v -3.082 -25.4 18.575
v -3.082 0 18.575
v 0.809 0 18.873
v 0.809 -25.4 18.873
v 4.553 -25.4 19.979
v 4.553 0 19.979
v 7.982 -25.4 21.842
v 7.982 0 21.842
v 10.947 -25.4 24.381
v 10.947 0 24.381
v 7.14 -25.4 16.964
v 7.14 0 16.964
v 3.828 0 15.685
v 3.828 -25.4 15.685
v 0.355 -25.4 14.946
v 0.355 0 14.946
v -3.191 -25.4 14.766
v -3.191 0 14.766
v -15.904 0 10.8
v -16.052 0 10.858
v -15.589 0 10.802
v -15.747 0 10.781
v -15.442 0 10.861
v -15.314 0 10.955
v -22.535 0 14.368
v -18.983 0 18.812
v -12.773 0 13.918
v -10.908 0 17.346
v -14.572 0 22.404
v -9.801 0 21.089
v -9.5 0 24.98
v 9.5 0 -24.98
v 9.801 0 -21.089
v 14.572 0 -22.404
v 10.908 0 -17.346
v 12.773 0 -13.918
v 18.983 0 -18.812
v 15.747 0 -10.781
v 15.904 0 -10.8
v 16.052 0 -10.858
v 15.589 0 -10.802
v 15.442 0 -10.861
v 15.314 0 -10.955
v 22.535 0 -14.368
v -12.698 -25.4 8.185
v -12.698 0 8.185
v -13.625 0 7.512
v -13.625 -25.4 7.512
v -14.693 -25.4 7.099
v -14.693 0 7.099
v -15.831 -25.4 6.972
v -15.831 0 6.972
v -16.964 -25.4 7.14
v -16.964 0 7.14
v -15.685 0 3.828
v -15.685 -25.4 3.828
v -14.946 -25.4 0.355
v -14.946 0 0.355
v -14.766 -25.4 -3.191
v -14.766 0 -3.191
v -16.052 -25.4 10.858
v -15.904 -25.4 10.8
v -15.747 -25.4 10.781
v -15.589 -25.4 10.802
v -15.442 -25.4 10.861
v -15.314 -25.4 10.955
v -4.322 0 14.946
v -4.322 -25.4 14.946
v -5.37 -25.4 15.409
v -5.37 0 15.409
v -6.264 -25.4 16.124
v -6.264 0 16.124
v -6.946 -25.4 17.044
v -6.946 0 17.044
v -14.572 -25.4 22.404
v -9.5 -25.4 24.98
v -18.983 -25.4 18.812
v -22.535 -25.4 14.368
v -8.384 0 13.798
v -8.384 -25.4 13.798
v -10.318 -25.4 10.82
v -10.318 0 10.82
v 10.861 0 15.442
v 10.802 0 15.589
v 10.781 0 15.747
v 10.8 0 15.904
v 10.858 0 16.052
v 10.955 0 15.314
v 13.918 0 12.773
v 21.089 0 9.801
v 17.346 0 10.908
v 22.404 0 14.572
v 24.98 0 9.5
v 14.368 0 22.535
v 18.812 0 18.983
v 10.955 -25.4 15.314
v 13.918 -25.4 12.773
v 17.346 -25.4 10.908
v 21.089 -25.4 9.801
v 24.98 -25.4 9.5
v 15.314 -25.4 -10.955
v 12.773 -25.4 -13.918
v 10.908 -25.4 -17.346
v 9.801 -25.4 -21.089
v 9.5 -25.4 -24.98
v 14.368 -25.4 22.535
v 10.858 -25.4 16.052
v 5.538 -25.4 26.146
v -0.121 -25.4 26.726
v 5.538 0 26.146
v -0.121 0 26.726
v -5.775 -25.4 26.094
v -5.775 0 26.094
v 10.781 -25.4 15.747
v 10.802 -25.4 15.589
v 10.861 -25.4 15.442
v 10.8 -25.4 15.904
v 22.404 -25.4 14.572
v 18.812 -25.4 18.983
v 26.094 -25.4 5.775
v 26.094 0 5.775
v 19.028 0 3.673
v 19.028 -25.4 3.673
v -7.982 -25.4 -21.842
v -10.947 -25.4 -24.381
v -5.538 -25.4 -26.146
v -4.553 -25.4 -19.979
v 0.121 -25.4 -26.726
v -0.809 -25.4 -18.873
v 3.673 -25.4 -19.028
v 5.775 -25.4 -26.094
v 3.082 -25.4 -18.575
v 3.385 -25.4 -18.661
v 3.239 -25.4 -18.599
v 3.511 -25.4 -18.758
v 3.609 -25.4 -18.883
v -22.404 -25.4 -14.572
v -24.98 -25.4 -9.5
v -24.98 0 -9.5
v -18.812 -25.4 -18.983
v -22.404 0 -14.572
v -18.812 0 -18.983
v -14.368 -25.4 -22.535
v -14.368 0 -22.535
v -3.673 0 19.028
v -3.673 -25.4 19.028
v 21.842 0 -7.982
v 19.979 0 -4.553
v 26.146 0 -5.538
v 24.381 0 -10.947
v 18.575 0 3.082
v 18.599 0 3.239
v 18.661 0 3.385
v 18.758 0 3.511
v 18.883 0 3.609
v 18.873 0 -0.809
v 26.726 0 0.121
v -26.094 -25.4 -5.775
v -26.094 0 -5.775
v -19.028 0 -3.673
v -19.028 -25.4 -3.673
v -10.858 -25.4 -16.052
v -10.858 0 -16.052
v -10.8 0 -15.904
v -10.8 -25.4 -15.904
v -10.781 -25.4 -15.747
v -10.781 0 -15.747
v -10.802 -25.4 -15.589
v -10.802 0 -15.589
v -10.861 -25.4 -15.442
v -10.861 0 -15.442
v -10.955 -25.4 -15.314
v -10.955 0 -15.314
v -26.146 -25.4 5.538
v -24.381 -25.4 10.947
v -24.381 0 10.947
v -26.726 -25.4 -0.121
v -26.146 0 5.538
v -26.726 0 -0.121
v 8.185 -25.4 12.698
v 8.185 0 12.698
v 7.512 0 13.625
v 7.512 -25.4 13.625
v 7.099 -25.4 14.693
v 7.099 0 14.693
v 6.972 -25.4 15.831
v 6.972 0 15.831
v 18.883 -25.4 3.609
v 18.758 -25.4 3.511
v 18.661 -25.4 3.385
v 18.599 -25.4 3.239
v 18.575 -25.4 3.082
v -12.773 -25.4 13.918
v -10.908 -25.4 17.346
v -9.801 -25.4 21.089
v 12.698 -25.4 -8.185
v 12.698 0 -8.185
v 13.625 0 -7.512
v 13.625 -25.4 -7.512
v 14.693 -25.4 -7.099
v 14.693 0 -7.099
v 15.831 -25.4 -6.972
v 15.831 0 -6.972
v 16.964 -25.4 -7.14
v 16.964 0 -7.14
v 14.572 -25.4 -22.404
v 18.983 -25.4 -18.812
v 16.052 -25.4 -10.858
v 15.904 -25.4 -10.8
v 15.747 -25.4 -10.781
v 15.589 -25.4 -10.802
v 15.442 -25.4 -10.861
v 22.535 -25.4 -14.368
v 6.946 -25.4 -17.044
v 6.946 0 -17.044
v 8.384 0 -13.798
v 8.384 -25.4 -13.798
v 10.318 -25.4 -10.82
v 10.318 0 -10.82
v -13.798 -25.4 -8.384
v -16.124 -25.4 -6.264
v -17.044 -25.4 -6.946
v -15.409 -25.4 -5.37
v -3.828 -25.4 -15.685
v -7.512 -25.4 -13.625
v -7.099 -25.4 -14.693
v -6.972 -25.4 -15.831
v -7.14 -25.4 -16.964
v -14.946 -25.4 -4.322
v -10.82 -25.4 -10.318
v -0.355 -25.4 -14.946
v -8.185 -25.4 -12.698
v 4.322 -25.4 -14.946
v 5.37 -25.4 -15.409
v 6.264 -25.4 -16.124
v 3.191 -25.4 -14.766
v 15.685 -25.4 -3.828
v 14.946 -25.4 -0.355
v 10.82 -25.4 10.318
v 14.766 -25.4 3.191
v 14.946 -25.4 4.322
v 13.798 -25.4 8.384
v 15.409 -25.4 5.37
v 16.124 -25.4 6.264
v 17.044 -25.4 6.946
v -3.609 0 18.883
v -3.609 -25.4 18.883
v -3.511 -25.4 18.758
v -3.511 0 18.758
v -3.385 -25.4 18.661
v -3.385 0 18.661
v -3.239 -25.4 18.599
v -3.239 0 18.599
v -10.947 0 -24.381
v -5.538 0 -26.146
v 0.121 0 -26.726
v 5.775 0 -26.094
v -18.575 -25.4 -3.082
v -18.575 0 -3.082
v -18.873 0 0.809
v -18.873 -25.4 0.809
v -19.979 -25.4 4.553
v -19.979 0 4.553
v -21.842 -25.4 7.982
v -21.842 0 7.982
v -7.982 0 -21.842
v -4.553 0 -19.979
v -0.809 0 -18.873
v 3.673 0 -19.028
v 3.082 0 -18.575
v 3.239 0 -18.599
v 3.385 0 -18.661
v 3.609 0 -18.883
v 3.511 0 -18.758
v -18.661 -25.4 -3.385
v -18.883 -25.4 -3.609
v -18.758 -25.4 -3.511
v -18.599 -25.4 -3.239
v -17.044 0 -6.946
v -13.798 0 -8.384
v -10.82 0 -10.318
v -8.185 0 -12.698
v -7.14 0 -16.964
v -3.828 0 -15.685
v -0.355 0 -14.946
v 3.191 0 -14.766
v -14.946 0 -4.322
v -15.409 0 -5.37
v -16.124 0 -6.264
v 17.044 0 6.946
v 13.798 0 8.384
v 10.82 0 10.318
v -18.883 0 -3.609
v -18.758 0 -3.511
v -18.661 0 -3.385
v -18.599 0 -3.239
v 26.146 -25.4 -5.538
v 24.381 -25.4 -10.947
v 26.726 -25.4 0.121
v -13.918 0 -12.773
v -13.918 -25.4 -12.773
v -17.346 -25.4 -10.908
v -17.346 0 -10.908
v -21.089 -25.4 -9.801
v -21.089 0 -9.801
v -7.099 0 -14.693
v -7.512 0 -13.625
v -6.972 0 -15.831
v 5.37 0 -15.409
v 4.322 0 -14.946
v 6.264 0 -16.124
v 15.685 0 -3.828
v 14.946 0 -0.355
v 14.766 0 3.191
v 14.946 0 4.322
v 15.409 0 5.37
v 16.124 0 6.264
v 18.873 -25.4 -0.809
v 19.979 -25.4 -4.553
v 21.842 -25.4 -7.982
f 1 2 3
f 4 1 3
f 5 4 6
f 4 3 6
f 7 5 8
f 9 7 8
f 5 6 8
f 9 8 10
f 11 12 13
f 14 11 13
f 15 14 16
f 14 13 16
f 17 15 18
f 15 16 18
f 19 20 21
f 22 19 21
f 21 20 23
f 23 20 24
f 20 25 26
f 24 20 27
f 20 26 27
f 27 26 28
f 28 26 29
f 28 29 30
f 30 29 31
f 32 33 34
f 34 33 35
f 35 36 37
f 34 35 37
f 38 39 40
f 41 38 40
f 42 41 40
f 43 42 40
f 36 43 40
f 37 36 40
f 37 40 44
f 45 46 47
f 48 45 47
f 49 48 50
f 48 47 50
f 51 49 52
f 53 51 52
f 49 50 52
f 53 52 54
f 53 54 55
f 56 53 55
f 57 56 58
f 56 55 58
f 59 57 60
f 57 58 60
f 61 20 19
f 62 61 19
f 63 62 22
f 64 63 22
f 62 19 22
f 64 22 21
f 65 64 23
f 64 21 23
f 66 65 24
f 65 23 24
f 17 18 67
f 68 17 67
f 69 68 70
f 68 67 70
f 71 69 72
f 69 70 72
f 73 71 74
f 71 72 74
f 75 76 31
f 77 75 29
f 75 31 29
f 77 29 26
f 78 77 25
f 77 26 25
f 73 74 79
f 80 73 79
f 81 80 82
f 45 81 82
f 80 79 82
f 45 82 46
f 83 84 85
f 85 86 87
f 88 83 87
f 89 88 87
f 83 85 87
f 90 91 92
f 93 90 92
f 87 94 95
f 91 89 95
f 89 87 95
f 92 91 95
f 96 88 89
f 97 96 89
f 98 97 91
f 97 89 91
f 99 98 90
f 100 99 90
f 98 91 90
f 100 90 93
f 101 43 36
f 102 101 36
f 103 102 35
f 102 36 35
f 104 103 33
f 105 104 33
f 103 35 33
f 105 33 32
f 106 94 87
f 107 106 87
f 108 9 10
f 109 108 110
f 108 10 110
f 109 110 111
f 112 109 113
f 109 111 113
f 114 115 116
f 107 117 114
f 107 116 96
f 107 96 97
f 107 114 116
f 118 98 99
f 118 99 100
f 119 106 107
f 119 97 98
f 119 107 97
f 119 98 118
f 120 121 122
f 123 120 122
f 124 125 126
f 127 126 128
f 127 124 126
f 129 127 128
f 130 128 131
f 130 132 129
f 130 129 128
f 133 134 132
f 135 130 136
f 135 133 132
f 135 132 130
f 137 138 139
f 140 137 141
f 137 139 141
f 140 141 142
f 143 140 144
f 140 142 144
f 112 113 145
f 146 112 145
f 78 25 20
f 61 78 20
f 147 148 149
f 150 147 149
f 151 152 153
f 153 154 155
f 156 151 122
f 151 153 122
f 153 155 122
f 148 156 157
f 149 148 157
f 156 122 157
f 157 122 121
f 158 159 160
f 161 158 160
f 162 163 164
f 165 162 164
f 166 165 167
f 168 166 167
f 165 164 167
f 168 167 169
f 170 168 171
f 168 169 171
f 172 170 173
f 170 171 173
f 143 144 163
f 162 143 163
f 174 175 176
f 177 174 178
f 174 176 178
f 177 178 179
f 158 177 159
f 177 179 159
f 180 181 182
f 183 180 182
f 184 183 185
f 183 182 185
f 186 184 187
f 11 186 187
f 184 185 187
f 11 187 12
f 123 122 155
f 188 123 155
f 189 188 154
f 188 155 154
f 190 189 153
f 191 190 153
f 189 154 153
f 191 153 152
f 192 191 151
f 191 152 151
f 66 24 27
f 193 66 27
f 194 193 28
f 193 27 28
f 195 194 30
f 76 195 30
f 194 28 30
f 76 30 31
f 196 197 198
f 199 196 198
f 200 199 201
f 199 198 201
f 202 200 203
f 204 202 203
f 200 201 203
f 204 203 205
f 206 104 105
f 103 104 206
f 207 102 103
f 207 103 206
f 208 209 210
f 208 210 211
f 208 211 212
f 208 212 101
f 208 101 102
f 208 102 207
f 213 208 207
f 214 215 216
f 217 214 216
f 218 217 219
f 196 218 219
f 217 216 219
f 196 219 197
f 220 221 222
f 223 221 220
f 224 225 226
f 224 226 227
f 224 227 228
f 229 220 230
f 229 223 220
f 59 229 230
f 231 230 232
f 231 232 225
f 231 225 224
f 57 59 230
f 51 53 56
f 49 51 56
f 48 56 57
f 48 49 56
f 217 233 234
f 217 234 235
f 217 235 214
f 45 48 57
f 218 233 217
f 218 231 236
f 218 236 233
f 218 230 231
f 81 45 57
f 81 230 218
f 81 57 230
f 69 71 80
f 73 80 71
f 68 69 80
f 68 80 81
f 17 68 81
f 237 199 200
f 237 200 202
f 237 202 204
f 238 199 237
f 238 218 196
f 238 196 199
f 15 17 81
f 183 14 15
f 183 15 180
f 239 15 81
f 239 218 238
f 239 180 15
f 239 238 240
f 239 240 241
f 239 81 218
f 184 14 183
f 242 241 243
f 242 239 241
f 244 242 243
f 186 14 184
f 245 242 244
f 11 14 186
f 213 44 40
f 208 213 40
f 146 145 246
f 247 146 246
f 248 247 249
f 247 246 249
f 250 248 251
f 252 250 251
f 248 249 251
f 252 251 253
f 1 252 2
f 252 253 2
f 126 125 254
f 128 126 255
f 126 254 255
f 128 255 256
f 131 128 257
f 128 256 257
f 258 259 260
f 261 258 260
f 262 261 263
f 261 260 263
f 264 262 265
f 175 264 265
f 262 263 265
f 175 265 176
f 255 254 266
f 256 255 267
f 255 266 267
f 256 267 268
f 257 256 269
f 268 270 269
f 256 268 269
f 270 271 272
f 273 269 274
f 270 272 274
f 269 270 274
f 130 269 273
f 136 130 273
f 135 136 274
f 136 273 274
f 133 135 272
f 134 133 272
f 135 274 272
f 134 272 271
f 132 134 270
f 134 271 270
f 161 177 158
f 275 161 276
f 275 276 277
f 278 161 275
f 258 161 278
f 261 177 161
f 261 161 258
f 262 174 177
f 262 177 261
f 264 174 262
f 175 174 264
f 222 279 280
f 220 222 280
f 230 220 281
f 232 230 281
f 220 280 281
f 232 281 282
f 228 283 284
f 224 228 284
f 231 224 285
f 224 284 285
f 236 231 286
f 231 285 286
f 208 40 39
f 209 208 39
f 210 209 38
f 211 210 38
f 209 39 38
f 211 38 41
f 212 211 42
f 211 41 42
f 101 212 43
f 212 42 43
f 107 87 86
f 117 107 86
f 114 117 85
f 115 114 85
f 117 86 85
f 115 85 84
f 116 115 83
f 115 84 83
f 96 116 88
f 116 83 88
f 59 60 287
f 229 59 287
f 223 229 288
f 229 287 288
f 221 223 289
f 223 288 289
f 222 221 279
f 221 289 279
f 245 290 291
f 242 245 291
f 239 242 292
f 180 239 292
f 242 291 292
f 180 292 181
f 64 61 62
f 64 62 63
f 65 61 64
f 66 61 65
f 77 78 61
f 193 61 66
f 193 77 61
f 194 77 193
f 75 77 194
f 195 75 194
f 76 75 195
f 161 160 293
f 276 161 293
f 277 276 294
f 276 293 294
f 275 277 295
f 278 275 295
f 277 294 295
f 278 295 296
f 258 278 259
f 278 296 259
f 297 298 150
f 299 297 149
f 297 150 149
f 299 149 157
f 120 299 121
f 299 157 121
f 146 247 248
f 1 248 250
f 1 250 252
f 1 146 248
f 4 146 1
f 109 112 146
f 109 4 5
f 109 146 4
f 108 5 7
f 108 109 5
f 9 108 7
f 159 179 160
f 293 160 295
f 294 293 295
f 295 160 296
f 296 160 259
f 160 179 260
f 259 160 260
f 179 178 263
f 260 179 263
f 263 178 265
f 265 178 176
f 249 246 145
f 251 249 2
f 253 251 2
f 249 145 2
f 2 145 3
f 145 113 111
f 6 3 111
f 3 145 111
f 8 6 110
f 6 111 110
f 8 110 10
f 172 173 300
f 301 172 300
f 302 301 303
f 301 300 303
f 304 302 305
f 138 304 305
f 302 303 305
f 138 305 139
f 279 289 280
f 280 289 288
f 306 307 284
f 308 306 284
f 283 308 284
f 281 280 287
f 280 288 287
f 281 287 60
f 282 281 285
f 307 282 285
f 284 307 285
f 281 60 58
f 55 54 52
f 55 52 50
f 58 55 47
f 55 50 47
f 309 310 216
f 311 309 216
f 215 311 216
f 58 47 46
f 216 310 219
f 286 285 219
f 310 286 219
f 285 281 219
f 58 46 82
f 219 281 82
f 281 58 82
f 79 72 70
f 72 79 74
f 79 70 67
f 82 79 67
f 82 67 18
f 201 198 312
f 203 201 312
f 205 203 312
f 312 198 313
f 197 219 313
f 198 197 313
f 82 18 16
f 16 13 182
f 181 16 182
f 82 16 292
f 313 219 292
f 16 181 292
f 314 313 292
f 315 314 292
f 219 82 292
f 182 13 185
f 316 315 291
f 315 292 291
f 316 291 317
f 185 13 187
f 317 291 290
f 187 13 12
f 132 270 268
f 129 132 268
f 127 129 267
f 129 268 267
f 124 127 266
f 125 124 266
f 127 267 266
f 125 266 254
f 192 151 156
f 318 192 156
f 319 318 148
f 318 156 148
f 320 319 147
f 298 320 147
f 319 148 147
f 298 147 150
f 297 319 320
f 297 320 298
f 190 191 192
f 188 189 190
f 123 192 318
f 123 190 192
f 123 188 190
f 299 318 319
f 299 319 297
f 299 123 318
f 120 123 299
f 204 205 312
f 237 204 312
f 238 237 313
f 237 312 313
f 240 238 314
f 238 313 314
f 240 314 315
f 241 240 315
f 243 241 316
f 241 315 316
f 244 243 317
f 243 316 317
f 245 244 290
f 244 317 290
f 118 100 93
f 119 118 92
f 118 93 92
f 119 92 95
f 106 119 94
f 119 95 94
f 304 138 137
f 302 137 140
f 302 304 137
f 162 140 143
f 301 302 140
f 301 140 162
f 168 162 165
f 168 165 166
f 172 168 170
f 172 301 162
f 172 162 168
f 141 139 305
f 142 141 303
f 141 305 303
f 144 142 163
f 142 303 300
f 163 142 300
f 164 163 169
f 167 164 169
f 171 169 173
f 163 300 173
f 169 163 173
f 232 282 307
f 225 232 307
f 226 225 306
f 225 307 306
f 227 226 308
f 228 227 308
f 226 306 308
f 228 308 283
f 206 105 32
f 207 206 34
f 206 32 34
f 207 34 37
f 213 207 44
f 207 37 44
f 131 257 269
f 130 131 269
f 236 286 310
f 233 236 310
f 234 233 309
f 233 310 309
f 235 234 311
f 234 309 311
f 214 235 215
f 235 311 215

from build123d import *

# Parameters (mm, degrees)
F1_DEPTH = 25.4


with BuildPart() as f1:
    # F0 (on Front) → F1 (new body)
    with BuildSketch(Plane.XZ):
        with BuildLine():
            ThreePointArc((-15.313666, 10.954702), (-10.908108, 17.346417), (-9.499596, 24.98049))
            ThreePointArc((-9.499596, 24.98049), (-16.87326, 20.725836), (-22.534882, 14.368238))
            Line((-22.534882, 14.368238), (-16.052009, 10.857974))
            ThreePointArc((-16.052009, 10.857974), (-15.667171, 10.786751), (-15.313666, 10.954702))
        make_face()
        with BuildLine():
            ThreePointArc((24.98049, 9.499596), (20.725836, 16.87326), (14.368238, 22.534882))
            Line((14.368238, 22.534882), (10.857974, 16.052009))
            ThreePointArc((10.857974, 16.052009), (10.786751, 15.667171), (10.954702, 15.313666))
            ThreePointArc((10.954702, 15.313666), (17.346417, 10.908108), (24.98049, 9.499596))
        make_face()
        with BuildLine():
            ThreePointArc((8.184689, 12.697728), (7.09886, 14.692712), (7.140369, 16.963672))
            ThreePointArc((7.140369, 16.963672), (2.106061, 15.246767), (-3.1912, 14.766099))
            ThreePointArc((-3.1912, 14.766099), (-5.369664, 15.408968), (-6.946124, 17.044131))
            ThreePointArc((-6.946124, 17.044131), (-9.291882, 12.270302), (-12.697728, 8.184689))
            ThreePointArc((-12.697728, 8.184689), (-14.692712, 7.09886), (-16.963672, 7.140369))
            ThreePointArc((-16.963672, 7.140369), (-15.246767, 2.106061), (-14.766099, -3.1912))
            ThreePointArc((-14.766099, -3.1912), (-15.408968, -5.369664), (-17.044131, -6.946124))
            ThreePointArc((-17.044131, -6.946124), (-12.270302, -9.291882), (-8.184689, -12.697728))
            ThreePointArc((-8.184689, -12.697728), (-7.09886, -14.692712), (-7.140369, -16.963672))
            ThreePointArc((-7.140369, -16.963672), (-2.106061, -15.246767), (3.1912, -14.766099))
            ThreePointArc((3.1912, -14.766099), (5.369664, -15.408968), (6.946124, -17.044131))
            ThreePointArc((6.946124, -17.044131), (9.291882, -12.270302), (12.697728, -8.184689))
            ThreePointArc((12.697728, -8.184689), (14.692712, -7.09886), (16.963672, -7.140369))
            ThreePointArc((16.963672, -7.140369), (15.246767, -2.106061), (14.766099, 3.1912))
            ThreePointArc((14.766099, 3.1912), (15.408968, 5.369664), (17.044131, 6.946124))
            ThreePointArc((17.044131, 6.946124), (12.270302, 9.291882), (8.184689, 12.697728))
        make_face()
        with BuildLine():
            ThreePointArc((10.946645, 24.381102), (2.724182, 26.586576), (-5.77469, 26.094447))
            Line((-5.77469, 26.094447), (-3.672738, 19.028231))
            ThreePointArc((-3.672738, 19.028231), (-3.450978, 18.705747), (-3.082253, 18.574541))
            ThreePointArc((-3.082253, 18.574541), (4.552572, 19.978966), (10.946645, 24.381102))
        make_face()
        with BuildLine():
            ThreePointArc((-24.381102, 10.946645), (-26.586576, 2.724182), (-26.094447, -5.77469))
            Line((-26.094447, -5.77469), (-19.028231, -3.672738))
            ThreePointArc((-19.028231, -3.672738), (-18.705747, -3.450978), (-18.574541, -3.082253))
            ThreePointArc((-18.574541, -3.082253), (-19.978966, 4.552572), (-24.381102, 10.946645))
        make_face()
        with BuildLine():
            ThreePointArc((-24.98049, -9.499596), (-20.725836, -16.87326), (-14.368238, -22.534882))
            Line((-14.368238, -22.534882), (-10.857974, -16.052009))
            ThreePointArc((-10.857974, -16.052009), (-10.786751, -15.667171), (-10.954702, -15.313666))
            ThreePointArc((-10.954702, -15.313666), (-17.346417, -10.908108), (-24.98049, -9.499596))
        make_face()
        with BuildLine():
            ThreePointArc((-10.946645, -24.381102), (-2.724182, -26.586576), (5.77469, -26.094447))
            Line((5.77469, -26.094447), (3.672738, -19.028231))
            ThreePointArc((3.672738, -19.028231), (3.450978, -18.705747), (3.082253, -18.574541))
            ThreePointArc((3.082253, -18.574541), (-4.552572, -19.978966), (-10.946645, -24.381102))
        make_face()
        with BuildLine():
            ThreePointArc((9.499596, -24.98049), (16.87326, -20.725836), (22.534882, -14.368238))
            Line((22.534882, -14.368238), (16.052009, -10.857974))
            ThreePointArc((16.052009, -10.857974), (15.667171, -10.786751), (15.313666, -10.954702))
            ThreePointArc((15.313666, -10.954702), (10.908108, -17.346417), (9.499596, -24.98049))
        make_face()
        with BuildLine():
            ThreePointArc((24.381102, -10.946645), (26.586576, -2.724182), (26.094447, 5.77469))
            Line((26.094447, 5.77469), (19.028231, 3.672738))
            ThreePointArc((19.028231, 3.672738), (18.705747, 3.450978), (18.574541, 3.082253))
            ThreePointArc((18.574541, 3.082253), (19.978966, -4.552572), (24.381102, -10.946645))
        make_face()
    extrude(amount=F1_DEPTH)


solid = f1.part
